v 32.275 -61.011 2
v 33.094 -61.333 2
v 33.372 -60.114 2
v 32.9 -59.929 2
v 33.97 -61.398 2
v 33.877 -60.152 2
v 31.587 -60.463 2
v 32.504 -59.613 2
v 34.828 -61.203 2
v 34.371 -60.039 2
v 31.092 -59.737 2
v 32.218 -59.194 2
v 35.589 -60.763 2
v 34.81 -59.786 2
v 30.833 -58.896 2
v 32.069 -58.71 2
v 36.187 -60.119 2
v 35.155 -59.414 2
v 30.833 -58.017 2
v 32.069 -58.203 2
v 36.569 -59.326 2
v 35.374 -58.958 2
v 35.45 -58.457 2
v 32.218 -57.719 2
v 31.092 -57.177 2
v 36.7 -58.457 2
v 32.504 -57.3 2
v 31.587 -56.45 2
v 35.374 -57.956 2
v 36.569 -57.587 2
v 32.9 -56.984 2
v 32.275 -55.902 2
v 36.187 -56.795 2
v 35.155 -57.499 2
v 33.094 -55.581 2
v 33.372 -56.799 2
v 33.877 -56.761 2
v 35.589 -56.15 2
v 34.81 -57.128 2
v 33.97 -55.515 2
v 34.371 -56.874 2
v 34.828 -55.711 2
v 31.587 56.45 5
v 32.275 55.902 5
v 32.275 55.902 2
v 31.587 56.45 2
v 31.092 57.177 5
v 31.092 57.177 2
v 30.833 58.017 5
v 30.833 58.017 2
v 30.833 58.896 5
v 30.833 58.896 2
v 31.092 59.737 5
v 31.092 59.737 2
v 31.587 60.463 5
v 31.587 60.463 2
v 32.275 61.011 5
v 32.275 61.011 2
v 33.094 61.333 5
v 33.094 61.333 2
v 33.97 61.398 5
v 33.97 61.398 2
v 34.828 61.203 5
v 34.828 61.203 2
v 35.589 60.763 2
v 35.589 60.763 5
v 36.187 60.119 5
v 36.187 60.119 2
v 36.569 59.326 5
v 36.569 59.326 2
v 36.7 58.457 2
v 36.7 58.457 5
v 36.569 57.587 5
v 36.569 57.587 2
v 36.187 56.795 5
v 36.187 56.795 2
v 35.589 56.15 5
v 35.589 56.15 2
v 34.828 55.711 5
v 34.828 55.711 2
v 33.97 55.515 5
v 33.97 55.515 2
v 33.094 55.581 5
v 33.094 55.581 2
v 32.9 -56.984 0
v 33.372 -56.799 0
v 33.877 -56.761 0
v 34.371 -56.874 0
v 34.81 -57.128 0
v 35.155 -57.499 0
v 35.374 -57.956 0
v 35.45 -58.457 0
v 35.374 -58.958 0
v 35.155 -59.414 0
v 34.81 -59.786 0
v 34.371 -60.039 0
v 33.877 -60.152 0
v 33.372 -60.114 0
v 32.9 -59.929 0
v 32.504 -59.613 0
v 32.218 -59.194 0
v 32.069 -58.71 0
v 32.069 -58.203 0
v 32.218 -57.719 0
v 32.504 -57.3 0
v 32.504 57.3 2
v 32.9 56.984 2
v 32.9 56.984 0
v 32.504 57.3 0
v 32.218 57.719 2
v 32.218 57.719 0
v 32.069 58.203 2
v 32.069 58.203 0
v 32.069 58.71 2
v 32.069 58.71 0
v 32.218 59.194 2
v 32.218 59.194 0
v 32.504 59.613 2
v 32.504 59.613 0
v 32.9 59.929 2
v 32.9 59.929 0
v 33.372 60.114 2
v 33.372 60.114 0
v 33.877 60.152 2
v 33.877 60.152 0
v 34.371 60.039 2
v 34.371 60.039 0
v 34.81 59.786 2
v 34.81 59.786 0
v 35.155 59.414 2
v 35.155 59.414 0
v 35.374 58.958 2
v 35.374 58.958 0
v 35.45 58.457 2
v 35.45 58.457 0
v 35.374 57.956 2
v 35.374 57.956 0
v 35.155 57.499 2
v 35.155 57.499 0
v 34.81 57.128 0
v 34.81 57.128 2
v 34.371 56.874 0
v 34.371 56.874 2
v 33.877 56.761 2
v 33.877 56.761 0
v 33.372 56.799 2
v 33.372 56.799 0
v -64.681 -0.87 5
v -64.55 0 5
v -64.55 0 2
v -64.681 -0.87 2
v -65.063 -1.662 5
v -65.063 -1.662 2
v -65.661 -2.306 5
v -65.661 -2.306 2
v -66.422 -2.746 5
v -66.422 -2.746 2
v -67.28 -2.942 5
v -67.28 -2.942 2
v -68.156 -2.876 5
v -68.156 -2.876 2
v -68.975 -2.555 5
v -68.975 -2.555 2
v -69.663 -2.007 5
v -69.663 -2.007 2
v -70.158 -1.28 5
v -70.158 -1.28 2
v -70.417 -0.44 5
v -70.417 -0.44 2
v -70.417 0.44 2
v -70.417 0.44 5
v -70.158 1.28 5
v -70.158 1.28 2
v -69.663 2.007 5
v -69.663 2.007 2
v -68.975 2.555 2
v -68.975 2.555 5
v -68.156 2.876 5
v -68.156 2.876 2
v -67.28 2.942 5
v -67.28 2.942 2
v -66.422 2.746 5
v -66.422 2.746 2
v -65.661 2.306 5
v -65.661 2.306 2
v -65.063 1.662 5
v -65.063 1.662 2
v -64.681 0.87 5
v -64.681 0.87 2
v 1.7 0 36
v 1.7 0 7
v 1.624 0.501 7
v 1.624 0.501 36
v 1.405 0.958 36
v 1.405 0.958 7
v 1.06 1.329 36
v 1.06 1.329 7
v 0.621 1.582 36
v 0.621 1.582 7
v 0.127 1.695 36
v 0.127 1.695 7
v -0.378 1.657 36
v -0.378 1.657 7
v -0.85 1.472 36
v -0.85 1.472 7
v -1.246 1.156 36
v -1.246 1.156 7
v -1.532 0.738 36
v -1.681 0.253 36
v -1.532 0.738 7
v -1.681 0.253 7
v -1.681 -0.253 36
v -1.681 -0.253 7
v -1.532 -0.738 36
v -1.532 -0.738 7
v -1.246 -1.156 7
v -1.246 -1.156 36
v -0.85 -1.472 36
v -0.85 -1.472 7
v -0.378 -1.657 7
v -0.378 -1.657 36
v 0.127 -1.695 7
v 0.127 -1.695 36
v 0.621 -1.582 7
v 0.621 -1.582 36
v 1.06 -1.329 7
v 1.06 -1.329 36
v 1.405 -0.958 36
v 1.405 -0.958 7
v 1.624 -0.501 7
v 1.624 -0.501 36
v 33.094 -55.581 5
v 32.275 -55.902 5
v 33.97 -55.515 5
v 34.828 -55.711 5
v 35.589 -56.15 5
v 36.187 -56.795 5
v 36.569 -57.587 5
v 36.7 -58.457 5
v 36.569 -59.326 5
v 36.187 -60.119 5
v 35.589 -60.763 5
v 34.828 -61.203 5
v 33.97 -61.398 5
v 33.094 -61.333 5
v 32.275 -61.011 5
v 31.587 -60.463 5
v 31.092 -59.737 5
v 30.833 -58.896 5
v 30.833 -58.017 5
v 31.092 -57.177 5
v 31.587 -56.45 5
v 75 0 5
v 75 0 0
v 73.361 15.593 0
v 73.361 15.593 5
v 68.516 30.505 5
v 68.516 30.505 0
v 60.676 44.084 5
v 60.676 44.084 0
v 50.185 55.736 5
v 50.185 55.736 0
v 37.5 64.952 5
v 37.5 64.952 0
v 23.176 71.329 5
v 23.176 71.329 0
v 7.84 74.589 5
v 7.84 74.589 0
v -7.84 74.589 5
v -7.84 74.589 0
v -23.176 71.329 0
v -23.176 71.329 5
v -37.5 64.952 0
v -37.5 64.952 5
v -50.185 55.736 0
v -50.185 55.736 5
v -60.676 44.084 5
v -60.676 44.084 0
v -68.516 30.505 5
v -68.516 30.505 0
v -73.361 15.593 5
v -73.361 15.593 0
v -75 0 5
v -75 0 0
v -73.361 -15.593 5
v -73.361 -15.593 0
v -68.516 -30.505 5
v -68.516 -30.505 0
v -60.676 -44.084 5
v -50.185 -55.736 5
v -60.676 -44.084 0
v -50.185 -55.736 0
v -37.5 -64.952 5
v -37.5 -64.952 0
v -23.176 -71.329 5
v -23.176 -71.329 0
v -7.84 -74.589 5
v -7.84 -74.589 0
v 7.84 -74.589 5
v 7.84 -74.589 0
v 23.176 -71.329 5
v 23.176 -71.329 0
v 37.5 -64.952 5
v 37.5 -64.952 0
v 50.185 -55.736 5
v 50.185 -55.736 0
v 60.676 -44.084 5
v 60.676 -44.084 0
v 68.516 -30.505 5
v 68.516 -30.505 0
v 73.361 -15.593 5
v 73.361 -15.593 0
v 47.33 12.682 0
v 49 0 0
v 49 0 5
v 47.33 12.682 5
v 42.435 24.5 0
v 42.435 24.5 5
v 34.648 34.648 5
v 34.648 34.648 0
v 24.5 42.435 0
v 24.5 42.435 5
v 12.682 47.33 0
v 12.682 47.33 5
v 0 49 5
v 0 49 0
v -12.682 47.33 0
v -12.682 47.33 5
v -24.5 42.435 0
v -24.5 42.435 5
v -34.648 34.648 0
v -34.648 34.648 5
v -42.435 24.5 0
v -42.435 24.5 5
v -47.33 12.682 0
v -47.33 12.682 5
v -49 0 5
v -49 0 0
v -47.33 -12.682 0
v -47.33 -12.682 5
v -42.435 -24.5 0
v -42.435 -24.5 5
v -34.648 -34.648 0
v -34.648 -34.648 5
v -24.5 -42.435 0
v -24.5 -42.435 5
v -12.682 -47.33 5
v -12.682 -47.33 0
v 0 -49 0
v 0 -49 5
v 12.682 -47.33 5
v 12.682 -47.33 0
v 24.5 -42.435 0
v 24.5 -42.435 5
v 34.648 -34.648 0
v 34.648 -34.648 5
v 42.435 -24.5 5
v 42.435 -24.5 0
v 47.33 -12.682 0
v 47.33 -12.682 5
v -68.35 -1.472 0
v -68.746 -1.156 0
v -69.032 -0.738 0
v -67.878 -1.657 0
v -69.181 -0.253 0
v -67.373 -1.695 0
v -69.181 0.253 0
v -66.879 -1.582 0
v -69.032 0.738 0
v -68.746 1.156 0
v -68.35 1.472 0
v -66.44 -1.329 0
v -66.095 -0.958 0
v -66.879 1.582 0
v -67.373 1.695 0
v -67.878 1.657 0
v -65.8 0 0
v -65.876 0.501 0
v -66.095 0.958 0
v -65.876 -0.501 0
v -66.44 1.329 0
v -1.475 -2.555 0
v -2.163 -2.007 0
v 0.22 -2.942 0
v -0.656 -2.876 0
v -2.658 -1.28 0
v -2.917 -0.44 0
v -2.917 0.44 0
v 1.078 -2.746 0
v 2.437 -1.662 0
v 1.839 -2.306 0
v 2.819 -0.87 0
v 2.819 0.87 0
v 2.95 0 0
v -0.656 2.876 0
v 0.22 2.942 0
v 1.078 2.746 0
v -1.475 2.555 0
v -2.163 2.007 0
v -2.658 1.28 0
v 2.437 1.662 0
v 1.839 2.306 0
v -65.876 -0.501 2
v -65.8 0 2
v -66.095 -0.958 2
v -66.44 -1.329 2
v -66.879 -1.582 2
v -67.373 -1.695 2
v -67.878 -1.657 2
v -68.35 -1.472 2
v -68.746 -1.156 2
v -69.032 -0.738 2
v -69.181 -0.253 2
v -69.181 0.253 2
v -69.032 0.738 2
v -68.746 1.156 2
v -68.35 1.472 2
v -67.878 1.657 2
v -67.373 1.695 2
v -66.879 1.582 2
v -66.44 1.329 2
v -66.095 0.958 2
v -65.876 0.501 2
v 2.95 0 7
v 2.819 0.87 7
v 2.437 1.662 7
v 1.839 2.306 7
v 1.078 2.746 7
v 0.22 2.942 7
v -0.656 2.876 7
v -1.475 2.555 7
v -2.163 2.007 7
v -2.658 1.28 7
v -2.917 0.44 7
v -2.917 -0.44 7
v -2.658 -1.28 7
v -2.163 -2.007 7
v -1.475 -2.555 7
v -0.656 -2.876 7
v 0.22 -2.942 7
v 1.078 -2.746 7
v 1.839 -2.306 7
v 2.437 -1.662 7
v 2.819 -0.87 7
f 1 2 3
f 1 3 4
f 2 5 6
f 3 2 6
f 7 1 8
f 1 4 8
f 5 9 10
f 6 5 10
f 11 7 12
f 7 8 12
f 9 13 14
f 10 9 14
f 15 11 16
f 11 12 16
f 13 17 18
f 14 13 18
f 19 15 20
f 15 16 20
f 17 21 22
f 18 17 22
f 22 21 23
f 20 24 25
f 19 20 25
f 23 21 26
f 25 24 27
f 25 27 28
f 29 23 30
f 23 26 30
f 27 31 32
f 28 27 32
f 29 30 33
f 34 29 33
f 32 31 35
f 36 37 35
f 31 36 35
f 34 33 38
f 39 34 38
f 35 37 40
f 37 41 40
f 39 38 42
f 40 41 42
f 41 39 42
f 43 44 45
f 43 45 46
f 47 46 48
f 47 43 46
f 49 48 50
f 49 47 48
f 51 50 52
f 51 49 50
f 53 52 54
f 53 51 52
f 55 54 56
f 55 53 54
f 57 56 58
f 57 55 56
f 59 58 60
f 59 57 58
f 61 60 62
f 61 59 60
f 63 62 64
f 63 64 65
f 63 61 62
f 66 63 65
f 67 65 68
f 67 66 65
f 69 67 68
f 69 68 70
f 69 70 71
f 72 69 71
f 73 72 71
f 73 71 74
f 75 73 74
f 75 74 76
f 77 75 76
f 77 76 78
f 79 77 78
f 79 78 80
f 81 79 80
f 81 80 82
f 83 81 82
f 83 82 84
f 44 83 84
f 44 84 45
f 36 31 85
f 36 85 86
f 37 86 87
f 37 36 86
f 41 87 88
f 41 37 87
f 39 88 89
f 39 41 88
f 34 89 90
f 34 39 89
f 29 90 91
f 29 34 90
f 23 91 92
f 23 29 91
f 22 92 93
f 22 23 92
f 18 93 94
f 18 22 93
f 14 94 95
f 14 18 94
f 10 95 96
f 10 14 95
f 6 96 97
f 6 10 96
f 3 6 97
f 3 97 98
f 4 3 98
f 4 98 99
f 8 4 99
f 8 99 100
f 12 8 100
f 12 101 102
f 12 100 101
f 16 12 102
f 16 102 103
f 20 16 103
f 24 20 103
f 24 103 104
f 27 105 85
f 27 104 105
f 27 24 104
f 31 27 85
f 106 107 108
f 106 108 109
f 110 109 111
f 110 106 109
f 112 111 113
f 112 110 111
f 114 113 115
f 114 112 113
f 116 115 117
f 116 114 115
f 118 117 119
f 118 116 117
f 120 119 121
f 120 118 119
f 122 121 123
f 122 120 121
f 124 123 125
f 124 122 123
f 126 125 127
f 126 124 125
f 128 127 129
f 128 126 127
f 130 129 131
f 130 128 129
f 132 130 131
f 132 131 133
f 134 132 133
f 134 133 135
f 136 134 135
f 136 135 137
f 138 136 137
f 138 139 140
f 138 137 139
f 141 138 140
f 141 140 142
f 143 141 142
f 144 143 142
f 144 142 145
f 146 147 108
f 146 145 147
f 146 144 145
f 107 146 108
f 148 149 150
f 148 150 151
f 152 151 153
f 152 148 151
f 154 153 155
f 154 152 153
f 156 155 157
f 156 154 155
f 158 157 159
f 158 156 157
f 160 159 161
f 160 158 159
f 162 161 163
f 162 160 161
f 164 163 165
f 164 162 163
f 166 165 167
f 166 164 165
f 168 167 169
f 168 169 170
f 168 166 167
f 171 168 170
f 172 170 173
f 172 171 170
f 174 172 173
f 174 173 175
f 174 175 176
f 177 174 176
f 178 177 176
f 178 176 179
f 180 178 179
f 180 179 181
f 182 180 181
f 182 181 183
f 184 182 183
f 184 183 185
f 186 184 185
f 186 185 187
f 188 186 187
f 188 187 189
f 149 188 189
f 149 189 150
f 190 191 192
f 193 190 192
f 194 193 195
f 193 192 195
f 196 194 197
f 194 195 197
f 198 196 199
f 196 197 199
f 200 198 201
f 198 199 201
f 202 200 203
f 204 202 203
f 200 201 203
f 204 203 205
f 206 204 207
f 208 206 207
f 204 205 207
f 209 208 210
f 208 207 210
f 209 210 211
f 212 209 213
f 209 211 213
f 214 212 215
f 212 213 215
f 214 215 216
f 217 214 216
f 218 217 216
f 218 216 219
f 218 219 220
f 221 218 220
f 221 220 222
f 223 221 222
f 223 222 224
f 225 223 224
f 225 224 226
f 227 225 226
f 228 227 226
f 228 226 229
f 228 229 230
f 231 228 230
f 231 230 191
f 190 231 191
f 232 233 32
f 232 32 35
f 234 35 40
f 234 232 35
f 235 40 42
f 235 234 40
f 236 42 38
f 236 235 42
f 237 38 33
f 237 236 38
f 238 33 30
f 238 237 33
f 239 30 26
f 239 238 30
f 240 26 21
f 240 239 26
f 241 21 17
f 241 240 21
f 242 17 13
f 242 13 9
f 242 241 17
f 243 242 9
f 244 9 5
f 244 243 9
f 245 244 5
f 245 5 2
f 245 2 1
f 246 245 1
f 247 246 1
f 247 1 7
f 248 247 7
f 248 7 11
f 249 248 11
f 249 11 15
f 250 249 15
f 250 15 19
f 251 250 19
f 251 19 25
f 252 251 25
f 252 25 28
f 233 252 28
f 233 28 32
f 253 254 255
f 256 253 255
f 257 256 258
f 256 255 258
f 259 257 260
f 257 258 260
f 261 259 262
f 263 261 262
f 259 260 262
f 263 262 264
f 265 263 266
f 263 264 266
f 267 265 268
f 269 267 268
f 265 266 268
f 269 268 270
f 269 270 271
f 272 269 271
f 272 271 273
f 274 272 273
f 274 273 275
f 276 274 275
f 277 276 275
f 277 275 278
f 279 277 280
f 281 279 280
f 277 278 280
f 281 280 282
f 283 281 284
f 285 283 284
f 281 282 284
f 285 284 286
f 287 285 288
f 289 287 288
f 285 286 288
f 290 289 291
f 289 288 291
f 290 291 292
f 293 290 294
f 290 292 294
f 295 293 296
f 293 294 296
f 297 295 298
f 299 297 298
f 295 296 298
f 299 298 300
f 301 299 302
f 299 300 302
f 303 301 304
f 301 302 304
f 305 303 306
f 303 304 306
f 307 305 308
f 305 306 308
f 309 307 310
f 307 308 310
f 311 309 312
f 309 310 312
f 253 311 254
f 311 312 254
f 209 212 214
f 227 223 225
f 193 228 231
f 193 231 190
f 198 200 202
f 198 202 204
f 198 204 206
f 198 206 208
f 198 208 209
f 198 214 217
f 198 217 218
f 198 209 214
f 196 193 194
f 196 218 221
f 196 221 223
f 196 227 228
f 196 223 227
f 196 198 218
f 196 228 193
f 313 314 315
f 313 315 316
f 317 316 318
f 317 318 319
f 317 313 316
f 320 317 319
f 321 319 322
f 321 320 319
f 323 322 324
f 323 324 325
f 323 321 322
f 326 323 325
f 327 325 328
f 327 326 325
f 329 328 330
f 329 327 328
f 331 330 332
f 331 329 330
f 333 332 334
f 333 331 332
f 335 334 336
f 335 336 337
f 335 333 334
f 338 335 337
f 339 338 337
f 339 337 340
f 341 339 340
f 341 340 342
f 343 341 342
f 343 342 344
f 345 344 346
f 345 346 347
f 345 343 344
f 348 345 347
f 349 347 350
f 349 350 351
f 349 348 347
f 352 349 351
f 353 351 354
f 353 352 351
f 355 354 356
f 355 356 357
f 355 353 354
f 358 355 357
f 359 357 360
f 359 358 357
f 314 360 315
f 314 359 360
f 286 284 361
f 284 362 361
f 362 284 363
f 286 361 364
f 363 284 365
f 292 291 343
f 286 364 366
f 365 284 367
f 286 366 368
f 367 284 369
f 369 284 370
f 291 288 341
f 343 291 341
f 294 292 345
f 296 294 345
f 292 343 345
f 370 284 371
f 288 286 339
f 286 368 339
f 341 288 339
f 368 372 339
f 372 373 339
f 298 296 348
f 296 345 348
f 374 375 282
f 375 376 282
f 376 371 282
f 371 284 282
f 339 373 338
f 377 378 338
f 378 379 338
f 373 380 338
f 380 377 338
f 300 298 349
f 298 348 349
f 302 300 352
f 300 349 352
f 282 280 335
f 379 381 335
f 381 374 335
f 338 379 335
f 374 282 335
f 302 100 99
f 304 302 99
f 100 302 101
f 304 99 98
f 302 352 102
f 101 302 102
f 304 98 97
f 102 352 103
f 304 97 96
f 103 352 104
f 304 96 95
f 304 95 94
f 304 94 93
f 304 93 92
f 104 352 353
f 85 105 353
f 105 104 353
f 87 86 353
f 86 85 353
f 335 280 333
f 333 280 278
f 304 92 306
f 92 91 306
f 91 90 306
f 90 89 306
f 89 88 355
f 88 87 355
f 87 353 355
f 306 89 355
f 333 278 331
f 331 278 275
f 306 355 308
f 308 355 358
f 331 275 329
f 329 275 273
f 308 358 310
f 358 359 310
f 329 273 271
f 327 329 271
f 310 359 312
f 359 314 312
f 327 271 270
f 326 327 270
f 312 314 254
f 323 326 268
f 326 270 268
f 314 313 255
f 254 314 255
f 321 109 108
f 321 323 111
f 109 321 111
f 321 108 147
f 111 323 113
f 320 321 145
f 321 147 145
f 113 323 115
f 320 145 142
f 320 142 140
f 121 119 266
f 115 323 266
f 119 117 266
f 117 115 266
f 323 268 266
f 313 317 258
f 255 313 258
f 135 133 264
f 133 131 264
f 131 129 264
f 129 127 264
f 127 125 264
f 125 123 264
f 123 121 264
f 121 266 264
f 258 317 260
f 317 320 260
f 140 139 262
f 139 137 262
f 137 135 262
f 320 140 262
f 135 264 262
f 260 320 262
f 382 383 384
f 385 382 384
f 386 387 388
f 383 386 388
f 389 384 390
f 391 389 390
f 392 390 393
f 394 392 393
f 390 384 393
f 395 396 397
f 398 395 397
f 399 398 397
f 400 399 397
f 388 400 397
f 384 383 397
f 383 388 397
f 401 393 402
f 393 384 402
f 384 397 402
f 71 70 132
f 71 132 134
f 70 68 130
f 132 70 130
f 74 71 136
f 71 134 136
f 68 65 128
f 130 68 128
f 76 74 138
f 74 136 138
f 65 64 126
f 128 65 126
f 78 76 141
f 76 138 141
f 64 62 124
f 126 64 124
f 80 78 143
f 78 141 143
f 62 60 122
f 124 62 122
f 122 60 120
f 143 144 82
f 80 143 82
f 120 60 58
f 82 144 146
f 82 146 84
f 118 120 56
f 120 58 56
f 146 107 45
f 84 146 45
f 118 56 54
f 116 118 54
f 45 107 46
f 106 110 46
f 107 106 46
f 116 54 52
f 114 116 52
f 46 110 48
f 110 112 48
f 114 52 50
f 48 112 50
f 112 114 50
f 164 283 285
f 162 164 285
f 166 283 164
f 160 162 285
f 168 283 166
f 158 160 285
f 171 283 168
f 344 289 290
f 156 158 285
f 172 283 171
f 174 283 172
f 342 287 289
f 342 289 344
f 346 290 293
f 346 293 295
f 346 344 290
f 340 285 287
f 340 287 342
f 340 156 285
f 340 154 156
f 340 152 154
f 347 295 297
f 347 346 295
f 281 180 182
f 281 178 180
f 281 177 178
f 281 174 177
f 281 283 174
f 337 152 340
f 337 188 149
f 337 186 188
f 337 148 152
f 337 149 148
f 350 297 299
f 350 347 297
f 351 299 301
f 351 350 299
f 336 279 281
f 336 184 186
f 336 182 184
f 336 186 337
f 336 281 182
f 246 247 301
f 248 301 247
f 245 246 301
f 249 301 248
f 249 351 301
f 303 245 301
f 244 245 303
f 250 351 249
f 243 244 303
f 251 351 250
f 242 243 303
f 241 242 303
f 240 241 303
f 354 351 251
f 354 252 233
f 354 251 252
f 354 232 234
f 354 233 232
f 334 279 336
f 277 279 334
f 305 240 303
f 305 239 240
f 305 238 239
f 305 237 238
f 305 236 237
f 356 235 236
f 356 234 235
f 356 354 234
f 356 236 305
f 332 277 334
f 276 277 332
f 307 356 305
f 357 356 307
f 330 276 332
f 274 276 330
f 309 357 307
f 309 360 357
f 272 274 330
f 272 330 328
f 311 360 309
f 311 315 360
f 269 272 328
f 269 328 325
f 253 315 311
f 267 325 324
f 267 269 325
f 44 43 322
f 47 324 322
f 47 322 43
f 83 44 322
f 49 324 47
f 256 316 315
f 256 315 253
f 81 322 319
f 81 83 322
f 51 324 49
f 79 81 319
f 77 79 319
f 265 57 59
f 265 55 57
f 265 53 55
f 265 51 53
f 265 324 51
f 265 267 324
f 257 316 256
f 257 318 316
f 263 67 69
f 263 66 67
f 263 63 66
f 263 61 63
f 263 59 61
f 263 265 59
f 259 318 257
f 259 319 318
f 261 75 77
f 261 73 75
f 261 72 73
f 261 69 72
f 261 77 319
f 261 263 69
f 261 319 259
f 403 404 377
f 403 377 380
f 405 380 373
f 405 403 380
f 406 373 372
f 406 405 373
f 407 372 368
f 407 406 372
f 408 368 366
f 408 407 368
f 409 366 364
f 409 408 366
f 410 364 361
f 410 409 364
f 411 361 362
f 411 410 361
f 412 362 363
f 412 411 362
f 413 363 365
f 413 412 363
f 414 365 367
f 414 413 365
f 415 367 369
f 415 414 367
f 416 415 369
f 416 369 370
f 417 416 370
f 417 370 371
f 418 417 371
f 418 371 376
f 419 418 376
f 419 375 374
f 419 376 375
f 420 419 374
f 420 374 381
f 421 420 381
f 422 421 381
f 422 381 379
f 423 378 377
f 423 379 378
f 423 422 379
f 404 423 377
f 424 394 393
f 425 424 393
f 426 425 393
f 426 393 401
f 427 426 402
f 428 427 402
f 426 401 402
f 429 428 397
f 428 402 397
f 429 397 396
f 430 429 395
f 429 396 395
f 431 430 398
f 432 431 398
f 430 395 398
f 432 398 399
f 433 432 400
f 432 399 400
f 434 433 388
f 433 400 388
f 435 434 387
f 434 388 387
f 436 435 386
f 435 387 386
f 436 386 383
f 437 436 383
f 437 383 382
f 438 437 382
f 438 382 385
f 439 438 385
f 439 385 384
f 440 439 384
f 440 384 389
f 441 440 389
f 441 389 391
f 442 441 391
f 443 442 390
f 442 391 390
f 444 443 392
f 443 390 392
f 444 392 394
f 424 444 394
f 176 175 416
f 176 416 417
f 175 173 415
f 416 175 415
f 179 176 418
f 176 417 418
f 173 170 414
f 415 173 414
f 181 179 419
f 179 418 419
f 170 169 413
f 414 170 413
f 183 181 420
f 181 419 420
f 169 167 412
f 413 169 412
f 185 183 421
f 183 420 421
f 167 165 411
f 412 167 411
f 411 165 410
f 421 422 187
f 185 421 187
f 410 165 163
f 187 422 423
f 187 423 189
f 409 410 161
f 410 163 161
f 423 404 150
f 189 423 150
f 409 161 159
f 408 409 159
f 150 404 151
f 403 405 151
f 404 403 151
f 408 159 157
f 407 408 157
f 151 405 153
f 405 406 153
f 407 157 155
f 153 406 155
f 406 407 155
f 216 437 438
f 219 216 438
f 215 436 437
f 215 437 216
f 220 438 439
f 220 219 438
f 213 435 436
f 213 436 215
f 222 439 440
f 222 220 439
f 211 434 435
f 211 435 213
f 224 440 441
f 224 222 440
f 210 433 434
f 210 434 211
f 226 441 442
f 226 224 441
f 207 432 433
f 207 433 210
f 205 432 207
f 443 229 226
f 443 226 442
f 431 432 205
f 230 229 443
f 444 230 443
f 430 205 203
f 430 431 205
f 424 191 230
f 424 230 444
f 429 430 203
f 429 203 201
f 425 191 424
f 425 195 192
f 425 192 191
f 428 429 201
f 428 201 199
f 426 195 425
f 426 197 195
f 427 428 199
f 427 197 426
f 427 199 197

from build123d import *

# Parameters (mm, degrees)
CYLINDER_R               = 2.95
CYLINDER_DEPTH           = 7
CYLINDER001_R            = 1.7
CYLINDER001_DEPTH        = 30
CLONE018_PLACEMENT_ANGLE = 180
ARRAY001_COUNT           = 3
SKETCH005_R              = 75
SKETCH005_R_2            = 49
PAD004_DEPTH             = 5


with BuildPart() as m3bolthead:
    # Cylinder → Cylinder (new body)
    with BuildSketch(Plane.XY):
        Circle(CYLINDER_R)
    extrude(amount=CYLINDER_DEPTH)


with BuildPart() as m3bolt:
    # Cylinder001 → Cylinder001 (new body)
    with BuildSketch(Plane.XY.offset(6)):
        Circle(CYLINDER001_R)
    extrude(amount=CYLINDER001_DEPTH)

    # Fusion: union M3BoltHead
    add(m3bolthead.part)


with BuildPart() as array001:
    # Clone018 base: copy of M3Bolt
    add(m3bolt.part)


with BuildPart() as array001_1:
    # Clone018 placement: moved
    add(array001.part.moved(Location((-67.5, 0, 9))).rotate(Axis((-67.5, 0, 9), (1, 0, 0)), CLONE018_PLACEMENT_ANGLE))

    # Array001: Array001 ×3 about axis
    array001_axis = Axis((0, 0, 0), (0, 0, 1))


with BuildPart() as array001_2:
    add(array001_1.part)
    for i in range(1, ARRAY001_COUNT):
        add(array001_1.part.rotate(array001_axis, i * 360 / ARRAY001_COUNT))


with BuildPart() as basebearingfix:
    # Sketch005 → Pad004 (new body)
    with BuildSketch(Plane.XY):
        Circle(SKETCH005_R)
        Circle(SKETCH005_R_2, mode=Mode.SUBTRACT)
    extrude(amount=PAD004_DEPTH)

    # Cut006: cut Array001
    add(array001_2.part, mode=Mode.SUBTRACT)


solid = Compound([m3bolt.part, basebearingfix.part])
